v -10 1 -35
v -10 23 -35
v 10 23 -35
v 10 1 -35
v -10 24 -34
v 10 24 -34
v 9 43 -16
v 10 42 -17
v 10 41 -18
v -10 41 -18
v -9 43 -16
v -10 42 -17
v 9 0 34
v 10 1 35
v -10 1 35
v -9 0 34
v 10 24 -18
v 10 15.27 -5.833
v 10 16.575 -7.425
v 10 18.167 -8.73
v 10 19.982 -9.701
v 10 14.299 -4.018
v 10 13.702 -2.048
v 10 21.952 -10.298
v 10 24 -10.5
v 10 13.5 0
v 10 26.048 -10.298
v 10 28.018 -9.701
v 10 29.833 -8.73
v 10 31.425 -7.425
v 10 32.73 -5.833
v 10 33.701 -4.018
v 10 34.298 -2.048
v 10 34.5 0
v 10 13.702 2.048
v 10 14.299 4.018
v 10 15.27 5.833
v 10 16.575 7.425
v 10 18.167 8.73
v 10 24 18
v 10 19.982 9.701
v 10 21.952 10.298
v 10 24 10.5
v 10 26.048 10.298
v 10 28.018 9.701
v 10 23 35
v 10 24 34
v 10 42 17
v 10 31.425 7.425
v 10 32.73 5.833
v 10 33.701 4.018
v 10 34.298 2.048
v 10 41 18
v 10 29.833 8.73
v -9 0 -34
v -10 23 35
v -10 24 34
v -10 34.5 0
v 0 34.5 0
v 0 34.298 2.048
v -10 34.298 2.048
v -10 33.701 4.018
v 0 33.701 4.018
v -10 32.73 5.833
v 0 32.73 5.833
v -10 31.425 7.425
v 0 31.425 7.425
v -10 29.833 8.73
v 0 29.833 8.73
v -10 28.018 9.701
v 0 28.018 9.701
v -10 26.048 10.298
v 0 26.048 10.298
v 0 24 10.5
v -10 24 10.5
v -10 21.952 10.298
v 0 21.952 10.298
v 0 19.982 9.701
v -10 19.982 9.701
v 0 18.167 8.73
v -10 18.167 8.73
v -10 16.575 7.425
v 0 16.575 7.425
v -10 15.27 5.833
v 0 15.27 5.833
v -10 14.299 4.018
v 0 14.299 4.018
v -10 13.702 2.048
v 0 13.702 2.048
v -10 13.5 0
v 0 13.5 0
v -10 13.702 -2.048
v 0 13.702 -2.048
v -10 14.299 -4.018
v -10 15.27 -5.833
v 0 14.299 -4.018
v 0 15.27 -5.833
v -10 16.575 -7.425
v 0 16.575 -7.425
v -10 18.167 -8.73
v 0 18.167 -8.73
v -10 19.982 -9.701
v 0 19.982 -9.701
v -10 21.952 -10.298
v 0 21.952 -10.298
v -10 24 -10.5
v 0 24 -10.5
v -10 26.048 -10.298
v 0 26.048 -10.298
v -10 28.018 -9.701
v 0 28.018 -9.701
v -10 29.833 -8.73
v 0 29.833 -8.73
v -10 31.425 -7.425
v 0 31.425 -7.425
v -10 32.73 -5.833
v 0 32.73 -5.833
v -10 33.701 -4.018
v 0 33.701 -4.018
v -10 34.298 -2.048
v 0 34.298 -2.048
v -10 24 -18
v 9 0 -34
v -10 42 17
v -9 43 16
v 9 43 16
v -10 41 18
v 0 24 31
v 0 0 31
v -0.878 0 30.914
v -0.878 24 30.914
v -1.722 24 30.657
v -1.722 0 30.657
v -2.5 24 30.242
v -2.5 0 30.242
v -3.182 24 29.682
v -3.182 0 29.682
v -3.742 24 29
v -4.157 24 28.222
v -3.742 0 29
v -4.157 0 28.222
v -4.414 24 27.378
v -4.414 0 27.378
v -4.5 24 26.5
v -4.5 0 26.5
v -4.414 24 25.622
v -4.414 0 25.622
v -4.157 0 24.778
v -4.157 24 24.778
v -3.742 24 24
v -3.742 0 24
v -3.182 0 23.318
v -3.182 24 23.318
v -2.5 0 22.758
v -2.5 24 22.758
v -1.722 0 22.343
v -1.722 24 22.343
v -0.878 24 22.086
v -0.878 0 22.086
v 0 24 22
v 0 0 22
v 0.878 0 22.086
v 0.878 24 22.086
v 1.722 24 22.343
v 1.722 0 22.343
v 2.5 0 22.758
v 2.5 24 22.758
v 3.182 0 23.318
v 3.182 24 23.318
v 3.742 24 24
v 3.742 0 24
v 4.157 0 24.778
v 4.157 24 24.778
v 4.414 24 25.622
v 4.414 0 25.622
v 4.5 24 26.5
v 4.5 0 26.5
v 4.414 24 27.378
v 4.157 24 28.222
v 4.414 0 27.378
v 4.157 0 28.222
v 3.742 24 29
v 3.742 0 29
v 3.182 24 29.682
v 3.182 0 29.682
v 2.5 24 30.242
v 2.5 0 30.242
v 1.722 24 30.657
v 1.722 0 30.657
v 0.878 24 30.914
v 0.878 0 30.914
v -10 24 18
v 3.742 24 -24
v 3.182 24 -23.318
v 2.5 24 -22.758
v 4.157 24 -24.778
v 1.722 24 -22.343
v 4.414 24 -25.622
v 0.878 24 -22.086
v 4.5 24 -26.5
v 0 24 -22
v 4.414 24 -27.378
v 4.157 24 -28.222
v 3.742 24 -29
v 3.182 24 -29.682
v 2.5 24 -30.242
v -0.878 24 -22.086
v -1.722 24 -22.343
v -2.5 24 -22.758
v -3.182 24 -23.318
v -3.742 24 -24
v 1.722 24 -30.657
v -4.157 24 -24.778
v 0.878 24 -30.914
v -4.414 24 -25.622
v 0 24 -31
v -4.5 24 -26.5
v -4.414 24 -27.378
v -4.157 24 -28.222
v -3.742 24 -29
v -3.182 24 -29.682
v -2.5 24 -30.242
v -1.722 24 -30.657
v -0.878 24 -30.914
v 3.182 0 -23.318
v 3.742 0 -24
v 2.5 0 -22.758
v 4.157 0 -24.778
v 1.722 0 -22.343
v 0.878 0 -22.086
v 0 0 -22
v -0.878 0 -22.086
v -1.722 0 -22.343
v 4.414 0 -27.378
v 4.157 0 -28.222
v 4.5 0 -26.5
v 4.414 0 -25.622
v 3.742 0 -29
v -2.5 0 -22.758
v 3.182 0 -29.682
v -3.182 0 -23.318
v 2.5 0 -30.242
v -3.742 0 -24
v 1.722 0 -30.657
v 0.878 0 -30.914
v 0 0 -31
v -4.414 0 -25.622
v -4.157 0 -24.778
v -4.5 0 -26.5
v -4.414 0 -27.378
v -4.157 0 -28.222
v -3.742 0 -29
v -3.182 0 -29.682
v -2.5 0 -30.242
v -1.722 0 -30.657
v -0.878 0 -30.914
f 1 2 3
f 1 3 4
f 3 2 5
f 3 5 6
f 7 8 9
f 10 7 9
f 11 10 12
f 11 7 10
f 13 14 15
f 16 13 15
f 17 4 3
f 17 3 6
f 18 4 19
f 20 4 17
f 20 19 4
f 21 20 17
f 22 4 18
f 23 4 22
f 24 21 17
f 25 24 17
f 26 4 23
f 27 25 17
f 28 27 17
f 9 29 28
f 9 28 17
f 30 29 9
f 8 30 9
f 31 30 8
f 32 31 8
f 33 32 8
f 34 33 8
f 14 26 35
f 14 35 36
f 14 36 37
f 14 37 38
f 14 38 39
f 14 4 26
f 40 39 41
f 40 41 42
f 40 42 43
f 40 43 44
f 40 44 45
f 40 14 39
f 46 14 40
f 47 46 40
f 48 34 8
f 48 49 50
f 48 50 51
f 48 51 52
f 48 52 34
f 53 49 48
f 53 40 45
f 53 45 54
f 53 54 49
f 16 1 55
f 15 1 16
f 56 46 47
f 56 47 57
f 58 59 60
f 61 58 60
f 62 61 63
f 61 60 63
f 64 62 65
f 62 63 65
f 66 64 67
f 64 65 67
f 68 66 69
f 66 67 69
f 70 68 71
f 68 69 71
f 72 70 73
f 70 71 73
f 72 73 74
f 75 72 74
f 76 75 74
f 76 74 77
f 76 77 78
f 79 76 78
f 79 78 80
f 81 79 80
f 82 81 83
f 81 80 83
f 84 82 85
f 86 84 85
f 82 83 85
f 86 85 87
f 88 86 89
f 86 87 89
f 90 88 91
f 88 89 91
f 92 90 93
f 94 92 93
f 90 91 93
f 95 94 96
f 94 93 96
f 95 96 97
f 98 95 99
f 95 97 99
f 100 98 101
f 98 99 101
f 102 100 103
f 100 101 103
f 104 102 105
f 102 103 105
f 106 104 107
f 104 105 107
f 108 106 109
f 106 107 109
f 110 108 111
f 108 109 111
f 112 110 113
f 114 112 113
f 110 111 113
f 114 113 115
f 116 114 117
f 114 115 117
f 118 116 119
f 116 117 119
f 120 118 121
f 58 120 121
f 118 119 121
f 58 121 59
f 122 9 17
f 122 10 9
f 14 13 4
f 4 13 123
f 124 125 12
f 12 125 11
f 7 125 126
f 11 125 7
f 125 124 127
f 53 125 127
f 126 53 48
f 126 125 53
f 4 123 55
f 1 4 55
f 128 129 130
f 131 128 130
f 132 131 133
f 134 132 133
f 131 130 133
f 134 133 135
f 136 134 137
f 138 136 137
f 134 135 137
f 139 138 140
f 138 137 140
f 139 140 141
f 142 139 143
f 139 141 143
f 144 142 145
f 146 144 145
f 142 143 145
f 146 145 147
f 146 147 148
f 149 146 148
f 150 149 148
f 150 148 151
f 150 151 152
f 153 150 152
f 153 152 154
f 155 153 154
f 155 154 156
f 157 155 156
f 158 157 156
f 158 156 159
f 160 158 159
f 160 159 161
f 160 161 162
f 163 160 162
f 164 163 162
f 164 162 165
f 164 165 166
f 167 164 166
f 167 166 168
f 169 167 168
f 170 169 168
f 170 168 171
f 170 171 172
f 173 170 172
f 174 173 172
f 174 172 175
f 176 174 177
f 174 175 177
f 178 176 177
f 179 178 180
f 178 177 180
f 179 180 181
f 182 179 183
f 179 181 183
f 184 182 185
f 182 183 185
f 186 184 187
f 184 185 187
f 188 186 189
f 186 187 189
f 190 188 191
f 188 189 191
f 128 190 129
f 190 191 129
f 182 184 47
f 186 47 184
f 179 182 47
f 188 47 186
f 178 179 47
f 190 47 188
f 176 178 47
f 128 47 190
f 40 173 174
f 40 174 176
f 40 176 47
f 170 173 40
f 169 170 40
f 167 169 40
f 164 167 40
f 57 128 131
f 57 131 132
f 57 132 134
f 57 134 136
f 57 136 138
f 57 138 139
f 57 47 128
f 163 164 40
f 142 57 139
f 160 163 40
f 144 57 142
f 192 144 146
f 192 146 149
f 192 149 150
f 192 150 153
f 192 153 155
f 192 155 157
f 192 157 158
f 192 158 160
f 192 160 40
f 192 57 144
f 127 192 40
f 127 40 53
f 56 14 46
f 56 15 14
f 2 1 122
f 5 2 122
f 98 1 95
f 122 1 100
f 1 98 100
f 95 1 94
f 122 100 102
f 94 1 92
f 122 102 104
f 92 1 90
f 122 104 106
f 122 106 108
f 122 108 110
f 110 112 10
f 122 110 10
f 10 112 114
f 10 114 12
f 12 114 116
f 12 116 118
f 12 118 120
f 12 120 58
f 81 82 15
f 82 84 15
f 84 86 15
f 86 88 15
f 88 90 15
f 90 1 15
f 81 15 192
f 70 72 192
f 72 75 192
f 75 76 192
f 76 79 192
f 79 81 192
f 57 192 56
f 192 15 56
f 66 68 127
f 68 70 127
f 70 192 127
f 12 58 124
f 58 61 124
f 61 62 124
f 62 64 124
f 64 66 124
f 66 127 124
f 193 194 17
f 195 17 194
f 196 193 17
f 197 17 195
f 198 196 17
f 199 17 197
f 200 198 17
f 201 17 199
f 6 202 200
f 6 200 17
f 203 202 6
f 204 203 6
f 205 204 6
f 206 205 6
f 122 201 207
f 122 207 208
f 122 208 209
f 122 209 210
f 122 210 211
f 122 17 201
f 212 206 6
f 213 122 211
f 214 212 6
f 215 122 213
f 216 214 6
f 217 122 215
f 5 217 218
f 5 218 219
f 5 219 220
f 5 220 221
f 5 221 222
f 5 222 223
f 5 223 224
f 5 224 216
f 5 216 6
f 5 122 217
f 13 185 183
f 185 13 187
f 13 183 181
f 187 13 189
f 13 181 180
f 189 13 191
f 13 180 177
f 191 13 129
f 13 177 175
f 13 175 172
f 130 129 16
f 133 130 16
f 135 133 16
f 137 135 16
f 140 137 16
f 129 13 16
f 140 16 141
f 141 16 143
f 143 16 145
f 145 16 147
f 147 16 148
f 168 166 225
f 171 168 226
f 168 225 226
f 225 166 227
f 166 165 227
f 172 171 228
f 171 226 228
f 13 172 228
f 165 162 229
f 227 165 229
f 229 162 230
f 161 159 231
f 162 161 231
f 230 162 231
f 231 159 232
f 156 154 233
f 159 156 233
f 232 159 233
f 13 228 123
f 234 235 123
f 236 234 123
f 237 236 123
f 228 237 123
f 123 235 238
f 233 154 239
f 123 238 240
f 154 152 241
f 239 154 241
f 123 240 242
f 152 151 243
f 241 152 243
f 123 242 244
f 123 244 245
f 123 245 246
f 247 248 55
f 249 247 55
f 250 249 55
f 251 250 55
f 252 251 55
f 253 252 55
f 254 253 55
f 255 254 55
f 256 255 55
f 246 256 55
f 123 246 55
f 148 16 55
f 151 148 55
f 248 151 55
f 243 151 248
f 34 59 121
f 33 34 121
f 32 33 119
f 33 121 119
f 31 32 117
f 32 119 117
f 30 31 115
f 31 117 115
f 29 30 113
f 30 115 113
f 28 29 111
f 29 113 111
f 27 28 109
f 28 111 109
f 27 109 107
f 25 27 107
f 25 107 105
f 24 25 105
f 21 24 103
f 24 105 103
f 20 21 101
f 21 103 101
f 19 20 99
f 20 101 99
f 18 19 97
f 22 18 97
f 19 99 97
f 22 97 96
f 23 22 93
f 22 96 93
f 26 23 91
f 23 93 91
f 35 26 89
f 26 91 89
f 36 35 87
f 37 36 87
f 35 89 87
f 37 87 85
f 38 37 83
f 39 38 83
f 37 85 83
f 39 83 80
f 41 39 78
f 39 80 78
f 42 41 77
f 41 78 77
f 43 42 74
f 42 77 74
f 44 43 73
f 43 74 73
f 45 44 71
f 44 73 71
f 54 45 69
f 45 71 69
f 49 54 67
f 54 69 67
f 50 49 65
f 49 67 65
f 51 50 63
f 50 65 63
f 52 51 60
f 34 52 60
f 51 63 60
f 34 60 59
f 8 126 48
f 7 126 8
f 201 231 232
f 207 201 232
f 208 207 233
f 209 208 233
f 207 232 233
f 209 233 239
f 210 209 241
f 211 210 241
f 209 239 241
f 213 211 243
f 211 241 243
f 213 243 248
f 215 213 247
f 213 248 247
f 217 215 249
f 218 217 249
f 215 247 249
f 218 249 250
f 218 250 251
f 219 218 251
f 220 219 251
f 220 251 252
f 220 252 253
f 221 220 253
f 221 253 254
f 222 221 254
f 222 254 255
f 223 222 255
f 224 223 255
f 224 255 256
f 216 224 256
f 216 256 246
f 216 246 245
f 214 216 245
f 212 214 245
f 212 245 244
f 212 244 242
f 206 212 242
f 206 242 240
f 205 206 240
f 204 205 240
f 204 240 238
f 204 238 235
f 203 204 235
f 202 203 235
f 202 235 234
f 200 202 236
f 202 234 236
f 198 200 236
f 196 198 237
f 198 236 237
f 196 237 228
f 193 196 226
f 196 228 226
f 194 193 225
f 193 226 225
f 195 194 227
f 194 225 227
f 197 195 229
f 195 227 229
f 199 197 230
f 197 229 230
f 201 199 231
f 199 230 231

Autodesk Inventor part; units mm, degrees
ref_plane "YZ Plane" through (0, 0, 0) normal (1, 0, 0) x (0, 1, 0)
ref_plane "XZ Plane" through (0, 0, 0) normal (0, 1, 0) x (-1, 0, 0)
ref_plane "XY Plane" through (0, 0, 0) normal (0, 0, 1) x (1, 0, 0)
sketch "Sketch1" plane through (0, 0, 0) normal (1, 0, 0) x (0, 1, 0)
  line L0 (-24, 35) -> (24, 35)
  line L1 (24, 35) -> (24, -35)
  line L2 (24, -35) -> (-24, -35)
  line L3 (-24, -35) -> (-24, 35)
  line L4 (-24, 35) -> (24, -35) construction
  line L5 (24, 35) -> (-24, -35) construction
  line L6 (-43, 18) -> (43, 18)
  line L7 (43, 18) -> (43, -18)
  line L8 (43, -18) -> (-43, -18)
  line L9 (-43, -18) -> (-43, 18)
  line L10 (-43, 18) -> (43, -18) construction
  line L11 (43, 18) -> (-43, -18) construction
  circle A0 centre (24, 0) radius 10.5
  line L12 (0, 35) -> (0, -35)
  point P0 (0, 0)
  point P1 (24, -18)
  point P2 (24, 18)
  dimension "d0" = 36
  dimension "d1" = 70
  dimension "d2" = 19
  dimension "d3" = 24
  dimension "d4" = 21
extrude "Extrusion1" add sketch "Sketch1" along normal mid plane 20 contours L0 L1 L6 L12 | L6 L1 A0 L8 L12 | L6 L7 L8 L1 A0 | L8 L1 L2 L12
sketch "Sketch2" plane through (-10, 24, -18) normal (0, 1, 0) x (1, 0, 0)
  line L0 (0, 0) -> (20, 0) projected
  line L1 (20, 17) -> (20, 0) projected
  line L2 (0, 17) -> (20, 17) projected
  line L3 (0, 0) -> (0, 17) projected
  line L4 (0, -53) -> (20, -53) projected
  line L5 (20, -36) -> (20, -53) projected
  line L6 (0, -36) -> (20, -36) projected
  line L7 (0, -53) -> (0, -36) projected
  line L8 (0, -53) -> (20, -36)
  line L9 (20, 17) -> (20, 0) projected
  line L10 (20, 0) -> (0, 17)
  point P0 (10, -18)
  point P1 (10, -44.5)
  point P2 (10, 8.5)
hole "Hole1" at (0, 24, 26.5) at (0, 24, -26.5) direction (0, -1, 0) diameter 9 end through all
chamfer "Chamfer1" distance 1 angle 45 2 edges at (-10, 43, 0) (10, 43, 0)
chamfer "Chamfer2" distance 1 angle 45 6 edges at (0, 24, 35) (0, 24, -35) (-10, 0, 0) (0, 0, -35) (10, 0, 0) (0, 0, 35)
chamfer "Chamfer3" distance 2 angle 45 2 edges at (0, 43, -18) (0, 43, 18)
properties part number "Goi_do_A" material "Iron, Gray"
